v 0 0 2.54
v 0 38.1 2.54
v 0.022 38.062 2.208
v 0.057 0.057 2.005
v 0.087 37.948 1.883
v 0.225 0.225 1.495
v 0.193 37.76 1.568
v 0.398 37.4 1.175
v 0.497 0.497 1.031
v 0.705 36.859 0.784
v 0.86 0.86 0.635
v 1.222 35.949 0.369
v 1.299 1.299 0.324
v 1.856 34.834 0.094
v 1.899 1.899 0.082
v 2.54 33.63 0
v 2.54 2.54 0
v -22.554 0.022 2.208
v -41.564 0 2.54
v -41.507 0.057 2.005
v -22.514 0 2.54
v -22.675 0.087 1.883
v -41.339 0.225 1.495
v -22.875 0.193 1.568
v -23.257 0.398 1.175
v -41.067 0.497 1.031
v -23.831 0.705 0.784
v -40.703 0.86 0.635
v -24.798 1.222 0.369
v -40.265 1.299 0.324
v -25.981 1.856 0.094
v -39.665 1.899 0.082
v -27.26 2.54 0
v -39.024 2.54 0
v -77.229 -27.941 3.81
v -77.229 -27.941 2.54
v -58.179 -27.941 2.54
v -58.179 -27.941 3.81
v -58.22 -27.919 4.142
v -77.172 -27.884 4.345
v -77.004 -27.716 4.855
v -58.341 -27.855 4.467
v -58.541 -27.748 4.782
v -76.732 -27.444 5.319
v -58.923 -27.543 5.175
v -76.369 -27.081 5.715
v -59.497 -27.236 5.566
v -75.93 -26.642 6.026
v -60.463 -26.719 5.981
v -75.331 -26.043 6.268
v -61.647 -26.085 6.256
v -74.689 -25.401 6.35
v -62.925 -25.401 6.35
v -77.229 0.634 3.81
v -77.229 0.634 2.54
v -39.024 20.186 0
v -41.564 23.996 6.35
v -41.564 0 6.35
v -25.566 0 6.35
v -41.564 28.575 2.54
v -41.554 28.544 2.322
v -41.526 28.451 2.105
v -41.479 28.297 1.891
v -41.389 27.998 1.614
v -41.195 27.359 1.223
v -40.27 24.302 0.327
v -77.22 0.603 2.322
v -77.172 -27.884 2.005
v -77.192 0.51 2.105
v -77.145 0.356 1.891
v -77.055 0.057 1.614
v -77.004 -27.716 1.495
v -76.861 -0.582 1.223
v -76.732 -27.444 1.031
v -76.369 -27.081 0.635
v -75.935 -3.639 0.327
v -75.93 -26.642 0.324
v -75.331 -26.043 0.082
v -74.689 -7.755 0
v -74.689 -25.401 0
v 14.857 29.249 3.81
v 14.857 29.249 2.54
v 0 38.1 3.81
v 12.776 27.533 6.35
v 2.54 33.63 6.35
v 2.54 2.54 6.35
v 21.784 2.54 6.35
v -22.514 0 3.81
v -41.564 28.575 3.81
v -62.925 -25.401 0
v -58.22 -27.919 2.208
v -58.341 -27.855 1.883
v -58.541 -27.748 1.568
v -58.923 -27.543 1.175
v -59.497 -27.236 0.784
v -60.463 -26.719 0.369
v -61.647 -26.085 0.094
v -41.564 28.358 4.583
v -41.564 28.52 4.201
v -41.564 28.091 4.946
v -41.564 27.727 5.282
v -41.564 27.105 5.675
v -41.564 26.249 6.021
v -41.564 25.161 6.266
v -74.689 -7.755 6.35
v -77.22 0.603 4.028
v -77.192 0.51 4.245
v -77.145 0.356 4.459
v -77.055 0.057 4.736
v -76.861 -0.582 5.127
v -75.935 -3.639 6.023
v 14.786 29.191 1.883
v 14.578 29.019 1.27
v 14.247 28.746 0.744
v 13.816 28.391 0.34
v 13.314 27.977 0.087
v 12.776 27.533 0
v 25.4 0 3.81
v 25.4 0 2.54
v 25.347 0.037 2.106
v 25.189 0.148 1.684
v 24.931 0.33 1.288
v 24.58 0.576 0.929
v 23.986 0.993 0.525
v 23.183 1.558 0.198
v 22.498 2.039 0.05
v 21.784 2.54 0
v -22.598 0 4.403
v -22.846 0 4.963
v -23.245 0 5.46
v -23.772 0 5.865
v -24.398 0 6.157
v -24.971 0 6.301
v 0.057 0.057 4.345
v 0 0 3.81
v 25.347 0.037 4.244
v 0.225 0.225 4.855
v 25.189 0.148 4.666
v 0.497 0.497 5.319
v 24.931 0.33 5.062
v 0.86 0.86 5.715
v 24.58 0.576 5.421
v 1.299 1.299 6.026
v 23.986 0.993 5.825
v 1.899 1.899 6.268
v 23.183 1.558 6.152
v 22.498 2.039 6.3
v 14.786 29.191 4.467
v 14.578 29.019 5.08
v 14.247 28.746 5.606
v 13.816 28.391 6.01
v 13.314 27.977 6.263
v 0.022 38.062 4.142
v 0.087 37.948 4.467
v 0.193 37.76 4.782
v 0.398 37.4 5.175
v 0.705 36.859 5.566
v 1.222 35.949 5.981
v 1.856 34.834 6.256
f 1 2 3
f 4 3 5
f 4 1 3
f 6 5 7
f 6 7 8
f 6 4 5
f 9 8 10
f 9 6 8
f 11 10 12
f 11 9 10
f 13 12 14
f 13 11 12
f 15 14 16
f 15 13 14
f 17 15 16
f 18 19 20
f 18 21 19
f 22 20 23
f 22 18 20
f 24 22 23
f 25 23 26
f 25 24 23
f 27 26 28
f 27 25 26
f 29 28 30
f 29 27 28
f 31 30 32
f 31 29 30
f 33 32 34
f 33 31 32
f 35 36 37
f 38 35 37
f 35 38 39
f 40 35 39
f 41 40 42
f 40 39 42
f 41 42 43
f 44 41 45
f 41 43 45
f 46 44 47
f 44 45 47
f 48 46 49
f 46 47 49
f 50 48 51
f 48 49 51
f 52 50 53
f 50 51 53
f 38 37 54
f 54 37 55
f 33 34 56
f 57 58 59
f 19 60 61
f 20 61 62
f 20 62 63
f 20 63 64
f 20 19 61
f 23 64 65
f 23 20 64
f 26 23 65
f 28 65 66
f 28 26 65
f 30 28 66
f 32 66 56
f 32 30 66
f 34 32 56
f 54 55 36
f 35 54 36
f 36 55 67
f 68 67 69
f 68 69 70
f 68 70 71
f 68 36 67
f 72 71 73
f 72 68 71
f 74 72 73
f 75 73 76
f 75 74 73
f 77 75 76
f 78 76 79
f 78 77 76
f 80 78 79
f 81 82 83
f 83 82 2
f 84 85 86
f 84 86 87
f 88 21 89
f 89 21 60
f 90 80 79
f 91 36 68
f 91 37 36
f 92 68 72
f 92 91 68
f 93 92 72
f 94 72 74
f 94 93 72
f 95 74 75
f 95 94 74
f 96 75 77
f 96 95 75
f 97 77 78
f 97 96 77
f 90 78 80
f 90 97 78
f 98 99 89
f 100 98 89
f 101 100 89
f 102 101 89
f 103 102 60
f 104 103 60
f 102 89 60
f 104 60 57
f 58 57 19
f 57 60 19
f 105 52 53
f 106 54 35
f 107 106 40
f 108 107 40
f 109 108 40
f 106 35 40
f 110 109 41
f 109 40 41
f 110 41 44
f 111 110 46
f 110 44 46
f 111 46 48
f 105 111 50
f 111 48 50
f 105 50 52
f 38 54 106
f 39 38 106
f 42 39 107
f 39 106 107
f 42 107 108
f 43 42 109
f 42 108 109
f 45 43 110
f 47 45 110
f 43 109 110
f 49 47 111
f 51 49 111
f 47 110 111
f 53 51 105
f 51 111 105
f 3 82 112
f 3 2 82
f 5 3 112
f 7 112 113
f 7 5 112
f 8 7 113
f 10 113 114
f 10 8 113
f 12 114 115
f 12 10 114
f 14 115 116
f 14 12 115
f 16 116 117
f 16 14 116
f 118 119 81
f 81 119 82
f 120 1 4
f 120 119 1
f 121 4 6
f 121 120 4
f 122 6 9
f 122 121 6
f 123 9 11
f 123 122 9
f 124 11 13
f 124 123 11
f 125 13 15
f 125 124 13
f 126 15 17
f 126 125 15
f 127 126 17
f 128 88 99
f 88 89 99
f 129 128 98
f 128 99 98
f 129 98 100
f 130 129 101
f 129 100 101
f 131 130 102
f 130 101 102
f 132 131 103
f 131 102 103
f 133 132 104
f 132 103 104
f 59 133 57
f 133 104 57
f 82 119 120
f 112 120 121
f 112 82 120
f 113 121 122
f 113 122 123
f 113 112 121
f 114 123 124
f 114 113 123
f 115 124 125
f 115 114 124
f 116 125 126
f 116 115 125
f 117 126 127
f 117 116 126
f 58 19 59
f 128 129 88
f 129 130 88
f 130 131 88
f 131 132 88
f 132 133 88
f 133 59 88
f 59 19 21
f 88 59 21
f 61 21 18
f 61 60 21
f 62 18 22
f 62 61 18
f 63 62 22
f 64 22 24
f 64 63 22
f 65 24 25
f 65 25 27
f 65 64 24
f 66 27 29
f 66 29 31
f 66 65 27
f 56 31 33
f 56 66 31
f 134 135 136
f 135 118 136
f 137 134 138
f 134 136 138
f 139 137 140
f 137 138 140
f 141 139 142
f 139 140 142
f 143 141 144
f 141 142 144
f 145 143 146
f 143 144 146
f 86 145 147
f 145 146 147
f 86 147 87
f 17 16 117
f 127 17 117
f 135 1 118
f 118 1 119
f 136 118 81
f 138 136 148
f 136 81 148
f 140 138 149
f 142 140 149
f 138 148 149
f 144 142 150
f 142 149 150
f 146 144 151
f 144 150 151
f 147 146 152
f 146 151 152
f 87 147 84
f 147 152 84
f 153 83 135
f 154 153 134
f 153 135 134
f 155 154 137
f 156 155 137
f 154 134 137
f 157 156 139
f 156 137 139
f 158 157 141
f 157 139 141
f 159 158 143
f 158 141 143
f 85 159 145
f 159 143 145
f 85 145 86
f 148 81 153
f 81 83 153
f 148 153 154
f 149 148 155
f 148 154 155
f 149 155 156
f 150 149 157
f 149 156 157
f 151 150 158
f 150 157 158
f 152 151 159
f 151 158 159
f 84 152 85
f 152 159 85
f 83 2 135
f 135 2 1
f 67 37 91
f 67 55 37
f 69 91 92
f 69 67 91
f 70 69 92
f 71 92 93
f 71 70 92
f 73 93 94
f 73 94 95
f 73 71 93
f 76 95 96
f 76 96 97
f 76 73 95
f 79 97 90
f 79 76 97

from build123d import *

# Parameters (mm, degrees)
F1_DEPTH = 6.35
F2_R     = 2.54
F4_DEPTH = 6.35
F5_R     = 2.54


with BuildPart() as f1:
    # F0 (on Top) → F1 (new body)
    with BuildSketch(Plane.XY):
        Polygon((0, 38.1), (0, 0), (25.4, 0), (14.856788, 29.249305), align=None)
    extrude(amount=F1_DEPTH)

    # F2
    f2_edges = [f1.edges().sort_by_distance(p)[0] for p in [
        (7.428394, 33.674652, 6.35),
        (0, 19.05, 6.35),
        (12.7, 0, 6.35),
        (20.128394, 14.624652, 6.35),
        (7.428394, 33.674652, 0),
        (0, 19.05, 0),
        (12.7, 0, 0),
        (20.128394, 14.624652, 0),
    ]]
    fillet(f2_edges, radius=F2_R)


with BuildPart() as f4:
    # F3 (on Top) → F4 (new body)
    with BuildSketch(Plane.XY):
        Polygon((-41.563635, 28.575), (-41.563635, 0), (-22.513635, 0), align=None)
        Polygon((-77.229266, 0.633772), (-77.229266, -27.941228), (-58.179266, -27.941228), align=None)
    extrude(amount=F4_DEPTH)

    # F5
    f5_edges = [f4.edges().sort_by_distance(p)[0] for p in [
        (-67.704266, -13.653728, 6.35),
        (-77.229266, -13.653728, 6.35),
        (-67.704266, -27.941228, 6.35),
        (-32.038635, 14.2875, 6.35),
        (-67.704266, -13.653728, 0),
        (-32.038635, 14.2875, 0),
        (-32.038635, 0, 0),
        (-77.229266, -13.653728, 0),
        (-67.704266, -27.941228, 0),
        (-41.563635, 14.2875, 0),
    ]]
    fillet(f5_edges, radius=F5_R)


solid = Compound([f1.part, f4.part])
